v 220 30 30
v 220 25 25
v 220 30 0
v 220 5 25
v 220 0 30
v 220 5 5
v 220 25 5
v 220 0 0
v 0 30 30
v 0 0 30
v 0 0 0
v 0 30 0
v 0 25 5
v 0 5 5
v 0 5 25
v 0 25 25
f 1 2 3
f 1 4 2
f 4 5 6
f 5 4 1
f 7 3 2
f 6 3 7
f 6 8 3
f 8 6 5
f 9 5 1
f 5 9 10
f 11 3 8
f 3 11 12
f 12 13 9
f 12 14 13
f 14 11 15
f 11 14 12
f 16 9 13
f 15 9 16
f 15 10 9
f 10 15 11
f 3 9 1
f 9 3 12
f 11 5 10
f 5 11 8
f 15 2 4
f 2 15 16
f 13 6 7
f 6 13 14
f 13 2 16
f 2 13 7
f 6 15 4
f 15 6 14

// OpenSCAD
$fn = 32;

// ----------------------------------------------------------------------
// Box beam: 200-250 mm hollow beam
// ----------------------------------------------------------------------

// --- parameters (mm) ---
beam_l = 220;             // beam length, X
beam_w = 30;              // beam width, Y
beam_h = 30;              // beam height, Z
wall = 5;                 // wall thickness

difference() {
  cube([beam_l, beam_w, beam_h]);
  translate([-1, wall, wall])
    cube([beam_l + 2, beam_w - 2 * wall, beam_h - 2 * wall]);
}
